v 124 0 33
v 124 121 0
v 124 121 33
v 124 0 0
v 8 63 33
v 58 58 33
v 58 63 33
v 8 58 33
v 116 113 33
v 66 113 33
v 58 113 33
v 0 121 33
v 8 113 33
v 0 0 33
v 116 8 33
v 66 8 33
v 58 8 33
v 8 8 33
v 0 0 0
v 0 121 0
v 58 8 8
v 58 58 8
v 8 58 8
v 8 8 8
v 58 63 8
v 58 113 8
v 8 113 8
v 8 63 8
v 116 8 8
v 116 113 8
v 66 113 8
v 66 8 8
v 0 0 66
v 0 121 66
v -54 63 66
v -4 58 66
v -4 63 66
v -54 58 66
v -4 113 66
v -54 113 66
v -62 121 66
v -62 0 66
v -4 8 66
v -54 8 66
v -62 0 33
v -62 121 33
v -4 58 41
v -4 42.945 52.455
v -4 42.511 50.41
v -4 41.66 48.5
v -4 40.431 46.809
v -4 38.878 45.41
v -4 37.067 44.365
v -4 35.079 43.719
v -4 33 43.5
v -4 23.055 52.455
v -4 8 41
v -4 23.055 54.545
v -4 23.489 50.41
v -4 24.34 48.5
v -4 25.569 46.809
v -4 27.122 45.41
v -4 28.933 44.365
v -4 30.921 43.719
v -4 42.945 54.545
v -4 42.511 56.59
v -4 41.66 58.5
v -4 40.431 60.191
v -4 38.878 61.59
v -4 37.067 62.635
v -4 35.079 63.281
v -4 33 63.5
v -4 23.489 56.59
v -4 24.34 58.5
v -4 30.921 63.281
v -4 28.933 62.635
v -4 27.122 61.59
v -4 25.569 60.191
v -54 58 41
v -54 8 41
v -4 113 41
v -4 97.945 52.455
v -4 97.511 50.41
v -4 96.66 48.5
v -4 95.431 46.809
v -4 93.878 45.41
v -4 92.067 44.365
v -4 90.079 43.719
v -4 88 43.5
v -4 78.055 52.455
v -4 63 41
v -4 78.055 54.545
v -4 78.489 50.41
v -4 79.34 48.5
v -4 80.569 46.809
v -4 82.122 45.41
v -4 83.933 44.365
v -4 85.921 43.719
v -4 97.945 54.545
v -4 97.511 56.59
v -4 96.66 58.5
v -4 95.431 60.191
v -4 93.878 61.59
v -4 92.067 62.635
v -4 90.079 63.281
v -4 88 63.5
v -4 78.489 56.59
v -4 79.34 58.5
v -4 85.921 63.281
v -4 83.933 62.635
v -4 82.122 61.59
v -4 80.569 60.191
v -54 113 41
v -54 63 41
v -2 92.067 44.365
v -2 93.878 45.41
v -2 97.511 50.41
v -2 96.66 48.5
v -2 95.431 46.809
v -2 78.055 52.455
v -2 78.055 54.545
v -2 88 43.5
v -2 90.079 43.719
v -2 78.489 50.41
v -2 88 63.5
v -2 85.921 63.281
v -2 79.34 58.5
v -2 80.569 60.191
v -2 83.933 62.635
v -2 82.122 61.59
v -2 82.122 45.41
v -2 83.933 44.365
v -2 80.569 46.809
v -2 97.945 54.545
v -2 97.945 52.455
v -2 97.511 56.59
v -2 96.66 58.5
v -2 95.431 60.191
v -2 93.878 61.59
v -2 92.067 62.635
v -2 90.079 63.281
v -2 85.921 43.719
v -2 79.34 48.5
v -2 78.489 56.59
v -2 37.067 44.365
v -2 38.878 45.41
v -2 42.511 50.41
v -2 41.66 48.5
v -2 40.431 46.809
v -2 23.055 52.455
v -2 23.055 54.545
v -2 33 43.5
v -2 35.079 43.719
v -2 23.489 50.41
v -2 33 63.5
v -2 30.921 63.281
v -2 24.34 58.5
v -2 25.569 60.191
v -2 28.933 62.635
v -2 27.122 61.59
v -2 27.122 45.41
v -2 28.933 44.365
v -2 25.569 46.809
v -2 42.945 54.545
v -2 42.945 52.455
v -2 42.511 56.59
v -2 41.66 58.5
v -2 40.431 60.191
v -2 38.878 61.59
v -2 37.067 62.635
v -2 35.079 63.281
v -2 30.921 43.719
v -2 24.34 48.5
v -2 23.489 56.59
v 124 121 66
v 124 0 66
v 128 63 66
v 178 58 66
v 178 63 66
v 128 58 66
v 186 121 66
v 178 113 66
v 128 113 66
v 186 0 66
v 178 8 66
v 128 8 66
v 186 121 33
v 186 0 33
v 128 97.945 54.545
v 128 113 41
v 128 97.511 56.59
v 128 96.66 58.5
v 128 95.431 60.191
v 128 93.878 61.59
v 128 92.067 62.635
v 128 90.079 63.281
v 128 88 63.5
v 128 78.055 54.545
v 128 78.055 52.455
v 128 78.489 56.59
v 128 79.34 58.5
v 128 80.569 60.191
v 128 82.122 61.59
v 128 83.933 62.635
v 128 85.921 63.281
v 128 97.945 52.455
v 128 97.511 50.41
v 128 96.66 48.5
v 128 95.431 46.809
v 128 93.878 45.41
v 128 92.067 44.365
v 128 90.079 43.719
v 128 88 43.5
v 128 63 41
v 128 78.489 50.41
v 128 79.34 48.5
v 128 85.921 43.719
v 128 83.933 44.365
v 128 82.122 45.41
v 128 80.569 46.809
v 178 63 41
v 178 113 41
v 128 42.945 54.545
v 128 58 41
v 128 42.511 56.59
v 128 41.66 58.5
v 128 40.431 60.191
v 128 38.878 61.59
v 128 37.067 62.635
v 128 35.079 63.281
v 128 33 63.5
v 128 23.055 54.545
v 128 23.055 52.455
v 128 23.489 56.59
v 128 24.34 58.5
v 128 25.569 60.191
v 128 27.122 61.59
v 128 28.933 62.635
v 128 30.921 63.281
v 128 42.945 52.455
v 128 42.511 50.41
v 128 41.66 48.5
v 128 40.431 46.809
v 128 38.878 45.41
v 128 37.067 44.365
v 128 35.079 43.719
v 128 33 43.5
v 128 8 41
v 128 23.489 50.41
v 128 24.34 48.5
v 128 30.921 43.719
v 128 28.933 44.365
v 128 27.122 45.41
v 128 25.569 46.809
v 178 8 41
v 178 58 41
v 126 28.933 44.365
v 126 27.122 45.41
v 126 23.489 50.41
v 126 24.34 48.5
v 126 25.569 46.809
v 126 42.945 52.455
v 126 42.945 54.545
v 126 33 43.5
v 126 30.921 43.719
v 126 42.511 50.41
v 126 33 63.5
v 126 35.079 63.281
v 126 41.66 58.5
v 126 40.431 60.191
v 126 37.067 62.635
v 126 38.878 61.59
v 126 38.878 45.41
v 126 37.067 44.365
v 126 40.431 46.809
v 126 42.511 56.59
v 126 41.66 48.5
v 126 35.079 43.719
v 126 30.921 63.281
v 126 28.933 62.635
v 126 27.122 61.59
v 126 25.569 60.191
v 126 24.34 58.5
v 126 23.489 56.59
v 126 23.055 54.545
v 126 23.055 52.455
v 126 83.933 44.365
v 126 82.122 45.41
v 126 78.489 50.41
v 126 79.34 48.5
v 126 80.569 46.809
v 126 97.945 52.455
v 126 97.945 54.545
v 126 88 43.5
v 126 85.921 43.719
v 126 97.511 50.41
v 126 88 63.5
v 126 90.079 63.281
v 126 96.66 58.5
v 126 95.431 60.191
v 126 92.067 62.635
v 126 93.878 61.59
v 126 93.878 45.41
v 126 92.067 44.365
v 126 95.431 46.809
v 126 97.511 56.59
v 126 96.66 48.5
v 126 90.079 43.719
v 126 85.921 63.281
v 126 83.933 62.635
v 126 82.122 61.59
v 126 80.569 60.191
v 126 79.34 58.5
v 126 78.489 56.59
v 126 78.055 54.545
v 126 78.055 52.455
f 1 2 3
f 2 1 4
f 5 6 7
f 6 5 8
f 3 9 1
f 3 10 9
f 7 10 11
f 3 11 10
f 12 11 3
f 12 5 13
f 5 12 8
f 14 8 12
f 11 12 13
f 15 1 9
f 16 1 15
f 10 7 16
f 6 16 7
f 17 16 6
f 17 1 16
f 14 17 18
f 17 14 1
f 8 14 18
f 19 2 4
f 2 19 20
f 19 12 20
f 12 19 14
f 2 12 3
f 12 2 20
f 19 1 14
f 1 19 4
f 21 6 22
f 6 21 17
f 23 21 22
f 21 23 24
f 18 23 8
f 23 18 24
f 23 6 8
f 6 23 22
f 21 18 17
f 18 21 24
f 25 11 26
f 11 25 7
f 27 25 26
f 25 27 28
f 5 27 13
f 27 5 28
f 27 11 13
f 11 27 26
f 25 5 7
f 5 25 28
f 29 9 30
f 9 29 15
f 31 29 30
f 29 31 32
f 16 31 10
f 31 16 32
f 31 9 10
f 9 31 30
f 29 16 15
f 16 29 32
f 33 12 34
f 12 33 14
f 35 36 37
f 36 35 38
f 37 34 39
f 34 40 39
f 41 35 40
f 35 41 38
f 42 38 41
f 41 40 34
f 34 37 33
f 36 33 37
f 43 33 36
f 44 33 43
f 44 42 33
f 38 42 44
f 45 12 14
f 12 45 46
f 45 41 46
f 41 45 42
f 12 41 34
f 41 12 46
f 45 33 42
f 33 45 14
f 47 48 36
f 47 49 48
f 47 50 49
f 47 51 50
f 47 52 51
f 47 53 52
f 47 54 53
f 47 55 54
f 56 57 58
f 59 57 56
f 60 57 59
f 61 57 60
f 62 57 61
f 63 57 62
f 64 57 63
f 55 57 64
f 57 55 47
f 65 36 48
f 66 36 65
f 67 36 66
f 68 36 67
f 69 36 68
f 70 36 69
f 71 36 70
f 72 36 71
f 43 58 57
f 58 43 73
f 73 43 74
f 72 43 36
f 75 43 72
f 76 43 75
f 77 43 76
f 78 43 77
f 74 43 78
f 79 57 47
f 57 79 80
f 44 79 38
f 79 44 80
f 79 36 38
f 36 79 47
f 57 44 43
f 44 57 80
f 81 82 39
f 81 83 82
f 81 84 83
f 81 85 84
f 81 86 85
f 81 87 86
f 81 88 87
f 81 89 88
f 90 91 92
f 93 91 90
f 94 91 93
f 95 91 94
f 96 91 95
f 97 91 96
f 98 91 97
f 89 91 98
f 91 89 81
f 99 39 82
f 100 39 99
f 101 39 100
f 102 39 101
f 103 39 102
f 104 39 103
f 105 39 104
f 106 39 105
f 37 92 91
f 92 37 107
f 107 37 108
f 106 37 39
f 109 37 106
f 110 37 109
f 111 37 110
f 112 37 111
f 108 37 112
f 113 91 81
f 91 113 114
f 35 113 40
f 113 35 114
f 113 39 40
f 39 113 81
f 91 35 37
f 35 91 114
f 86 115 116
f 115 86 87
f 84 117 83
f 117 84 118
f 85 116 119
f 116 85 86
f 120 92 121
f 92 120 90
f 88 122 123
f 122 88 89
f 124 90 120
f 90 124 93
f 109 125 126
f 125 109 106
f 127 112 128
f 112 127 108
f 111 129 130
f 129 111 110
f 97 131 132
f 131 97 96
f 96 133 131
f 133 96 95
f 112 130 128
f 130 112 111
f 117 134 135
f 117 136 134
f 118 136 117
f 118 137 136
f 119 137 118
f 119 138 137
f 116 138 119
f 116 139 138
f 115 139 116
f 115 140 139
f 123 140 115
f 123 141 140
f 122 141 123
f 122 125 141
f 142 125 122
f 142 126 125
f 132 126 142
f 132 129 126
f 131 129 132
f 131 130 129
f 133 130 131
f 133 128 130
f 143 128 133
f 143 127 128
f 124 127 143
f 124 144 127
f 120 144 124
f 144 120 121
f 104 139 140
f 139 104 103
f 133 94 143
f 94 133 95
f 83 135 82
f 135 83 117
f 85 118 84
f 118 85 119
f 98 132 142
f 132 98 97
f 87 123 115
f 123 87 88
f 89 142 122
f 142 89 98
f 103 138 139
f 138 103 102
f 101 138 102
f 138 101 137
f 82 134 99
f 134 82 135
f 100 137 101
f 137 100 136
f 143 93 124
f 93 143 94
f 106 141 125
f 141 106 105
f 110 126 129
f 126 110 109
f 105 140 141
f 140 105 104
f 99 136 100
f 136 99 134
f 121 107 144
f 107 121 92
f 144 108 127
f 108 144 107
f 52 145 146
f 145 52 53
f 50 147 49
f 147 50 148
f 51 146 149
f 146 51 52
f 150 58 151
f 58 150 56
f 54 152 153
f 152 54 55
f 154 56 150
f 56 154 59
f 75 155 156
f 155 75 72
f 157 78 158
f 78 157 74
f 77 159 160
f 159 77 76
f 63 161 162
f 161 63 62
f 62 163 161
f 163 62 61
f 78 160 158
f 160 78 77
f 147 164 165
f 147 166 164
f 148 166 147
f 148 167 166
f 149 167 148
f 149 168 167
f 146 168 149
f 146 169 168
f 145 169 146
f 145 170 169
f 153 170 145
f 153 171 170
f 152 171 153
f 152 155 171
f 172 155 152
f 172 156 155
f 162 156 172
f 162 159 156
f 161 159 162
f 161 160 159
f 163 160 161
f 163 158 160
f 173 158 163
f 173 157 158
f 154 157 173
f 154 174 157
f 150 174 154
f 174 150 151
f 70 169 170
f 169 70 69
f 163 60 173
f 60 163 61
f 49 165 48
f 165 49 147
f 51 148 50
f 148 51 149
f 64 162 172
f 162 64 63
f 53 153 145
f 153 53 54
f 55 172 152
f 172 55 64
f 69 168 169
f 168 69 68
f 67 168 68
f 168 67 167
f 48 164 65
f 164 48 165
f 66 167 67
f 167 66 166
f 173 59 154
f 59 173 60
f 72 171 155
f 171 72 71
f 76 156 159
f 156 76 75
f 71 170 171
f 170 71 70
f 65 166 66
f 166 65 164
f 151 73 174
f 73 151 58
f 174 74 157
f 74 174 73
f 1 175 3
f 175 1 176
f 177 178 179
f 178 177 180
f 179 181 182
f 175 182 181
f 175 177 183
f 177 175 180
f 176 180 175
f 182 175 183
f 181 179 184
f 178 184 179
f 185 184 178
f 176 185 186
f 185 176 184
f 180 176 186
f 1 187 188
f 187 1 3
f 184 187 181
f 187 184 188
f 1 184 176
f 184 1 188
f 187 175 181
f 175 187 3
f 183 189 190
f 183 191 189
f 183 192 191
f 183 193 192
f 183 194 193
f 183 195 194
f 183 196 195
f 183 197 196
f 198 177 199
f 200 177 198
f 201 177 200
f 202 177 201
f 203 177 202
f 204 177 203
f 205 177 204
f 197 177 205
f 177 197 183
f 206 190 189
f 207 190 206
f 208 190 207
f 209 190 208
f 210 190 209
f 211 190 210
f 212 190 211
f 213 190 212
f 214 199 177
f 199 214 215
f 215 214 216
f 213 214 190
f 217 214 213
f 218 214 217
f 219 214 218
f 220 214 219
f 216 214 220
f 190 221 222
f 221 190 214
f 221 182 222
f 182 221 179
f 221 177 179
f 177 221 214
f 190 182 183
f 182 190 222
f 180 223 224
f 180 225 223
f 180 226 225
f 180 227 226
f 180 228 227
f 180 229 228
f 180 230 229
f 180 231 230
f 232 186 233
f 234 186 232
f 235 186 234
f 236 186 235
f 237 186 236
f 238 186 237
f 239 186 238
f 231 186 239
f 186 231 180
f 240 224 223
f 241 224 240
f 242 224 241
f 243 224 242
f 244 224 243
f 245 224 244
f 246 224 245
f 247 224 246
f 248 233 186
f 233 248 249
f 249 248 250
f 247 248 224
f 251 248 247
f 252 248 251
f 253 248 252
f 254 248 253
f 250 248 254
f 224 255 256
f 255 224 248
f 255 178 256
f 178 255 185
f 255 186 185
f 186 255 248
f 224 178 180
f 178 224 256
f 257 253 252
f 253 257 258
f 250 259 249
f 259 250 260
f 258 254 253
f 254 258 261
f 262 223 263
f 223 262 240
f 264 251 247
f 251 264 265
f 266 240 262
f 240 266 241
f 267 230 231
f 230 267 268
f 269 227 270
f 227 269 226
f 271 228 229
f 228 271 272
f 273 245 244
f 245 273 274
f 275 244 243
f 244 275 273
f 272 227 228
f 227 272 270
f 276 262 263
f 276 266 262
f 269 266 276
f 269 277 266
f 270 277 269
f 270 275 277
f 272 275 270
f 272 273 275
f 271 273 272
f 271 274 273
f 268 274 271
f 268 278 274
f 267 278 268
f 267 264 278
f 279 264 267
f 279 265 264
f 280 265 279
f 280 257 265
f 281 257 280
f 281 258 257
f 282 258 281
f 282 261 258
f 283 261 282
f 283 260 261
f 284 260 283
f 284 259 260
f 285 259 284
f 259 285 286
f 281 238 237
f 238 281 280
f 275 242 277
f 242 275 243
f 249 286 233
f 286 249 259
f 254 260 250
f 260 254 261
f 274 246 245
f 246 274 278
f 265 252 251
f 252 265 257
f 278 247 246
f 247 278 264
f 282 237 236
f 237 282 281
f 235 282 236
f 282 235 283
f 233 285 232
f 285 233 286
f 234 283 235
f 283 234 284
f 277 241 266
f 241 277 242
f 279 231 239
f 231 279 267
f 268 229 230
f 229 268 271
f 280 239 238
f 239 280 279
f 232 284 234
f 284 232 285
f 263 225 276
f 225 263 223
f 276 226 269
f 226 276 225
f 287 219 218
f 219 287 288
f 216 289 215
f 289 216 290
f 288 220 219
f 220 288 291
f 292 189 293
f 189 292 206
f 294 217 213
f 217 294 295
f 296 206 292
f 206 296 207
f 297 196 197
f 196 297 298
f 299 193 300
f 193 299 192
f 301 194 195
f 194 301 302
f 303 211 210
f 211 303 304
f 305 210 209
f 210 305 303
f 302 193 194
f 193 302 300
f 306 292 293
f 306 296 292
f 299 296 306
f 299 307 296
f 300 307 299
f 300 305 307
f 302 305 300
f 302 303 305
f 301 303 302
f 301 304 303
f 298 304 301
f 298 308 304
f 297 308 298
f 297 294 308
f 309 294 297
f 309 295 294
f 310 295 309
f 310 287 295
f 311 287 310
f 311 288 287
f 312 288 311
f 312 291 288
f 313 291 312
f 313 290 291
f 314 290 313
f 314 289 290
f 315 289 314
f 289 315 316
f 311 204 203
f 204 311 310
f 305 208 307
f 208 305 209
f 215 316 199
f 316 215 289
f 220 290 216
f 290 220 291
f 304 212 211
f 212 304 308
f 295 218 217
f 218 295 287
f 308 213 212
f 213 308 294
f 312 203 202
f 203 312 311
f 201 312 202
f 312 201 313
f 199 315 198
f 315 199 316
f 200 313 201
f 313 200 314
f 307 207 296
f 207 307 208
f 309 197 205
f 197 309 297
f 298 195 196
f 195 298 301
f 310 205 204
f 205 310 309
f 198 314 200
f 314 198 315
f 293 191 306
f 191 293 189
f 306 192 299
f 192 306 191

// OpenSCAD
OW_THICC = 8;
IW_THICC = 5;
SLOT_SIZES = [50, 50, 25];
ND_SLOT = [20, 2];


module rotate_around(pt, rotation) {
    translate(pt)
    rotate(rotation)
    translate(-pt)
    children();
}


module top_part() {
    difference() {
        cube([1*SLOT_SIZES.x + (3/2)*OW_THICC,
              2*SLOT_SIZES.y + 2*OW_THICC + IW_THICC,
              SLOT_SIZES.z + OW_THICC]);
        translate([OW_THICC, OW_THICC, OW_THICC])
            cube([SLOT_SIZES.x, SLOT_SIZES.y, SLOT_SIZES.z+1]);
        translate([OW_THICC, OW_THICC + IW_THICC + SLOT_SIZES.y, OW_THICC])
            cube([SLOT_SIZES.x, SLOT_SIZES.y, SLOT_SIZES.z+1]);
        translate([OW_THICC + SLOT_SIZES.x -1,
                   OW_THICC + SLOT_SIZES.y/2 + IW_THICC + SLOT_SIZES.y,
                   OW_THICC + SLOT_SIZES.z/2])
            rotate([0, 90, 0])
            cylinder(ND_SLOT.y+1, ND_SLOT.x/2, ND_SLOT.x/2);
        translate([OW_THICC + SLOT_SIZES.x -1,
                   OW_THICC + SLOT_SIZES.y/2,
                   OW_THICC + SLOT_SIZES.z/2])
            rotate([0, 90, 0])
            cylinder(ND_SLOT.y+1, ND_SLOT.x/2, ND_SLOT.x/2);
    }
}


difference() {
    cube([2*SLOT_SIZES.x + 3*OW_THICC,
          2*SLOT_SIZES.y + 2*OW_THICC + IW_THICC,
          SLOT_SIZES.z + OW_THICC]);
    translate([OW_THICC, OW_THICC, OW_THICC])
        cube([SLOT_SIZES.x, SLOT_SIZES.y, SLOT_SIZES.z+1]);
    translate([OW_THICC, OW_THICC + IW_THICC + SLOT_SIZES.y, OW_THICC])
        cube([SLOT_SIZES.x, SLOT_SIZES.y, SLOT_SIZES.z+1]);
    translate([2*OW_THICC + SLOT_SIZES.x, OW_THICC, OW_THICC])
        cube([SLOT_SIZES.x, 2*SLOT_SIZES.y + IW_THICC, SLOT_SIZES.z+1]);
}
translate([-((3/2)*OW_THICC + SLOT_SIZES.x), 0, SLOT_SIZES.z + OW_THICC])
    top_part();
rotate_around([(2*SLOT_SIZES.x + 3*OW_THICC)/2,
               (2*SLOT_SIZES.y + 2*OW_THICC + IW_THICC)/2,
               0],
              [0, 0, 180])
    translate([-((3/2)*OW_THICC + SLOT_SIZES.x), 0, SLOT_SIZES.z + OW_THICC])
    top_part();
